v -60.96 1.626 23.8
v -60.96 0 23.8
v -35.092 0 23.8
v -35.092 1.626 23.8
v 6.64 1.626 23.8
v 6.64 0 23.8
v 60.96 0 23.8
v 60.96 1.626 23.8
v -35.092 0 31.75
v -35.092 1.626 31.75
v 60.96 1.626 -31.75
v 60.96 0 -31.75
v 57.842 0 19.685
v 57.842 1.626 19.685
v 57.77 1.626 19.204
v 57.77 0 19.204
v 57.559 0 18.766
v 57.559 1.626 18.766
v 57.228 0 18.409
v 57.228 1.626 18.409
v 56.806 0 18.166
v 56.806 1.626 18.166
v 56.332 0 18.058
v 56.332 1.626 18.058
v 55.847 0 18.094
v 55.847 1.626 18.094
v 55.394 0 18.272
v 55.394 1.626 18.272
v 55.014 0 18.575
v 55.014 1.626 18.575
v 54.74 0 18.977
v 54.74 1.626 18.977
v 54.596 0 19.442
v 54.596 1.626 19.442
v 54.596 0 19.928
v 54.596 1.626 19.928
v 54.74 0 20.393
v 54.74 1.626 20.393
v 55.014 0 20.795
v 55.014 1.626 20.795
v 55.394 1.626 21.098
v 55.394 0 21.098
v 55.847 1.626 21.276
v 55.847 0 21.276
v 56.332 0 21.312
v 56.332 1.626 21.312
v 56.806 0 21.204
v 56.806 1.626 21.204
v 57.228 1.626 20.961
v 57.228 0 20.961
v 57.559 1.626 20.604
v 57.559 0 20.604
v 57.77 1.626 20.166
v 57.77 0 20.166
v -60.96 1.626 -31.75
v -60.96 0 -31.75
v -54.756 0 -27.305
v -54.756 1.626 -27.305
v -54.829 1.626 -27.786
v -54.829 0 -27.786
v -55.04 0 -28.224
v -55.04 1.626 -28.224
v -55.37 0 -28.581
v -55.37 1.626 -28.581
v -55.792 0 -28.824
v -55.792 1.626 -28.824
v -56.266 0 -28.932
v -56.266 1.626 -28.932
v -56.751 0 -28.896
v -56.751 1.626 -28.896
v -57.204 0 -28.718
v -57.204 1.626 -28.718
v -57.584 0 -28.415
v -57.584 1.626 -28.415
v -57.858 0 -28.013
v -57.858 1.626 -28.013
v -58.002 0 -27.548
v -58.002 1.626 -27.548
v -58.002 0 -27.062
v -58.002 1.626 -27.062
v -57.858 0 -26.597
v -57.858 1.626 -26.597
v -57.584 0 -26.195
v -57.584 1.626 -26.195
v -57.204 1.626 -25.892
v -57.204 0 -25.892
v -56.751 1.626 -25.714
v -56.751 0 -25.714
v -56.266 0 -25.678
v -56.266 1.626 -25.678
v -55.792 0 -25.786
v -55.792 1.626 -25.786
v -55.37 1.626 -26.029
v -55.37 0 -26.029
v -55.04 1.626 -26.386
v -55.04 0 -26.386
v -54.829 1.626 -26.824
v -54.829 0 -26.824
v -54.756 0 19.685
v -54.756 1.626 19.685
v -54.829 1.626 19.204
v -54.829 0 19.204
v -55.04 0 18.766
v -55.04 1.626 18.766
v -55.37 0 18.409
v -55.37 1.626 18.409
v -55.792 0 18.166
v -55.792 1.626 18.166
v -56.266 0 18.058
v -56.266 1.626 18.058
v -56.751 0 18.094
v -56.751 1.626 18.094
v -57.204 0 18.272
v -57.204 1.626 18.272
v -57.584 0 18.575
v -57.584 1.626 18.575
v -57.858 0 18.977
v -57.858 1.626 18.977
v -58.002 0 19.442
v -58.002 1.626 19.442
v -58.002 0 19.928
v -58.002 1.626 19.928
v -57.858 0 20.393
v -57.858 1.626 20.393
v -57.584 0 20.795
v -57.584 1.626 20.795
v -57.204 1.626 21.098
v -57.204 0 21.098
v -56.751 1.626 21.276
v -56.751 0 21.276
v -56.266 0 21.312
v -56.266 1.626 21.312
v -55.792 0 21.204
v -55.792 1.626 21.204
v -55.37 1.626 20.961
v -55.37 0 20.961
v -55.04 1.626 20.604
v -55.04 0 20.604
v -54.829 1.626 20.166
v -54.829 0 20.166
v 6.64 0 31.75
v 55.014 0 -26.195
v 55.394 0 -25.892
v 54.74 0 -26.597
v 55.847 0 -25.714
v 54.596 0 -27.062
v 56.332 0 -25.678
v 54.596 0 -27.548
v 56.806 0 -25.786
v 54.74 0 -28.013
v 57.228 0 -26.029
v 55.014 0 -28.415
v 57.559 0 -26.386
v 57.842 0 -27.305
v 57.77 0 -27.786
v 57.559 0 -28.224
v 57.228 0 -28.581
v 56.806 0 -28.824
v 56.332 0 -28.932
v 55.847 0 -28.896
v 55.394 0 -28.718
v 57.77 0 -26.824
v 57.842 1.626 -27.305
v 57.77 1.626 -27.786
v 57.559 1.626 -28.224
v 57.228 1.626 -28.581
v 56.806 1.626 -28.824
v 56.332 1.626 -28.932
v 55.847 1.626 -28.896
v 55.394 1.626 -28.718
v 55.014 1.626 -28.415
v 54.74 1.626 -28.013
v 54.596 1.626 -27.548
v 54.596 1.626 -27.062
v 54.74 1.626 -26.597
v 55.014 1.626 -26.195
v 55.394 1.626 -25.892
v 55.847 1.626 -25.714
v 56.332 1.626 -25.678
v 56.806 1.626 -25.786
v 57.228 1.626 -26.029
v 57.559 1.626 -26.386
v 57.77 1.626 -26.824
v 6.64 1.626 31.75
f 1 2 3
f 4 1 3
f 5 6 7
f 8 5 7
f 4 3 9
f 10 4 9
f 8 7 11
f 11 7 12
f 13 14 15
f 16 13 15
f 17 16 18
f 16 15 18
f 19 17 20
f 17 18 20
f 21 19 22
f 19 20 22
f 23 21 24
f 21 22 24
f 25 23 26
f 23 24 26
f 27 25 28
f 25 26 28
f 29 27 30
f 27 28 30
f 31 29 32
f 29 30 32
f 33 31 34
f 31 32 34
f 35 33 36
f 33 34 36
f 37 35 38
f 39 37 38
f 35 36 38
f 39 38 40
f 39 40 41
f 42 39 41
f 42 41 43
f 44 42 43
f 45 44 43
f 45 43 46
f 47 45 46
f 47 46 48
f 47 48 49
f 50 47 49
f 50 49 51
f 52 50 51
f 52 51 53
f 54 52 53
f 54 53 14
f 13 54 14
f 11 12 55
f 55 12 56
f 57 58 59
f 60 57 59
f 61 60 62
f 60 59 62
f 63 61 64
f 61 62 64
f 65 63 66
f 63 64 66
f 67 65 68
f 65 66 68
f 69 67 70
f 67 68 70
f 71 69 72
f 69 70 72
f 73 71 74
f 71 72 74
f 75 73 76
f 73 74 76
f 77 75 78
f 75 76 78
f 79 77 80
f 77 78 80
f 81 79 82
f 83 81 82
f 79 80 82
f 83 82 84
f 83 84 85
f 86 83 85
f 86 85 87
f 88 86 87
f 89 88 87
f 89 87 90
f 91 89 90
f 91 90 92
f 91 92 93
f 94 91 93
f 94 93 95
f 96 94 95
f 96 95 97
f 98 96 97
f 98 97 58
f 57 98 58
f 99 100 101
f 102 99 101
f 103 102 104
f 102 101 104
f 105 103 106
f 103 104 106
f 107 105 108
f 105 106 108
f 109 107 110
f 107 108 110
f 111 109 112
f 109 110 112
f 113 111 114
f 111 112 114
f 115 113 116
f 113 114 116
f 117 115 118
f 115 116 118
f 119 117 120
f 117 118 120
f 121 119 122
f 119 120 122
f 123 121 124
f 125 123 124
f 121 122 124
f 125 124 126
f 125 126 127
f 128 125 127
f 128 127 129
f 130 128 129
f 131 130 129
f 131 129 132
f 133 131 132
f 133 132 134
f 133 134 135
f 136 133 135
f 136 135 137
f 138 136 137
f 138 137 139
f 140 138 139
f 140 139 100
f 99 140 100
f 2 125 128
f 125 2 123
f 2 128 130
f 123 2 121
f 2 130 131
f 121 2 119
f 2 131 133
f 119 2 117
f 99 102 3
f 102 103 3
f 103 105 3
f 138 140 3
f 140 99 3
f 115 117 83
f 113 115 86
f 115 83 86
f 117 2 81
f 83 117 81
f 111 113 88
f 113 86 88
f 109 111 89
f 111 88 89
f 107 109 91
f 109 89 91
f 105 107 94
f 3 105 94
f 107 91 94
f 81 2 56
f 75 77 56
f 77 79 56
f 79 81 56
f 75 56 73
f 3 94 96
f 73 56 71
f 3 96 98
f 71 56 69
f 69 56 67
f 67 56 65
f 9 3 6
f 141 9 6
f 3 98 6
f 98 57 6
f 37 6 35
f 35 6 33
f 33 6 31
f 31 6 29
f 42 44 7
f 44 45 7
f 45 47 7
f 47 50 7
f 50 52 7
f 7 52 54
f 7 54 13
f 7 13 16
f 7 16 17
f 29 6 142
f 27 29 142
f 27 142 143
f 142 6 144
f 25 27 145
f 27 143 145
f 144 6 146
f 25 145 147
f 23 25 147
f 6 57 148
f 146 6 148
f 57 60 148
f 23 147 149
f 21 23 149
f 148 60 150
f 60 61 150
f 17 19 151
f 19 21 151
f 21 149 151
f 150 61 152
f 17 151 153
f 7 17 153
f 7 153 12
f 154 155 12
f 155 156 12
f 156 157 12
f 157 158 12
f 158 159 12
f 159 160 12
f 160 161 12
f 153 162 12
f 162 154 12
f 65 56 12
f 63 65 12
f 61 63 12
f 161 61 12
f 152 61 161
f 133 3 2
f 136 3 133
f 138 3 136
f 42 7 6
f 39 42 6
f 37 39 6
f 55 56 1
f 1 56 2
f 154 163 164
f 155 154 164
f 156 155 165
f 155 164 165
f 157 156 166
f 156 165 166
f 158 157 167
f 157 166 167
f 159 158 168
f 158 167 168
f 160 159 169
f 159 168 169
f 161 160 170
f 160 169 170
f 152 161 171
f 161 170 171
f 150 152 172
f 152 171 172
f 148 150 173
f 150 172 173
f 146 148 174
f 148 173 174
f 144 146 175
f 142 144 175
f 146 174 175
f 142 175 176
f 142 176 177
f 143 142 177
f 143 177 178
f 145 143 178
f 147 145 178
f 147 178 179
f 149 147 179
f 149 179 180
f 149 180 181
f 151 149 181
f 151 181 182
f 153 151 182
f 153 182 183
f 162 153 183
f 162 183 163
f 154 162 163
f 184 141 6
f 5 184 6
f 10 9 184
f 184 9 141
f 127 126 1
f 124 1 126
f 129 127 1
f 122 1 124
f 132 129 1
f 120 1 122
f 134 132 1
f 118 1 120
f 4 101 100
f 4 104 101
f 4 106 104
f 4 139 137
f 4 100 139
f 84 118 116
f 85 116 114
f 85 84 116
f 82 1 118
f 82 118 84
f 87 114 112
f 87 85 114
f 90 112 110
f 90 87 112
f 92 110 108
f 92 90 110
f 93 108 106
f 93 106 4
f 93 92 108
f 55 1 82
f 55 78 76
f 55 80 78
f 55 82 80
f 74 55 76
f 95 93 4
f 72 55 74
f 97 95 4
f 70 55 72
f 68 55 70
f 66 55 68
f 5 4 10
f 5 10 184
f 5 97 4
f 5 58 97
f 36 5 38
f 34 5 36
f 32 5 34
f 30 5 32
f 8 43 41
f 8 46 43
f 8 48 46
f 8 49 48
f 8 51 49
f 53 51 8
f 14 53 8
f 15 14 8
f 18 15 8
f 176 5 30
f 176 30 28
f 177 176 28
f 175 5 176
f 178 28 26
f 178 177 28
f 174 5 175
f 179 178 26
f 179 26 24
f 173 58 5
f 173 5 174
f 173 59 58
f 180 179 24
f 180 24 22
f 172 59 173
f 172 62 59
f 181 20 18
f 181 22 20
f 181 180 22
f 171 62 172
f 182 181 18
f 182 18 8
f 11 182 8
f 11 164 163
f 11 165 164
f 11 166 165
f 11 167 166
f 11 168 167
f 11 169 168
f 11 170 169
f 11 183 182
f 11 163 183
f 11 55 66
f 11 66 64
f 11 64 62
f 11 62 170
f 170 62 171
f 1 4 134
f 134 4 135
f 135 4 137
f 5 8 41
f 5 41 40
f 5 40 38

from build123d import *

# Parameters (mm, degrees)
BOSS_EXTRUDE1_DEPTH       = 1.6256
F_4_CLEARANCE_HOLE1_D     = 3.2639
F_4_CLEARANCE_HOLE1_DEPTH = 56.388
F_4_CLEARANCE_HOLE1_TIP   = 0.980574487


with BuildPart() as part:
    # Sketch1 → Boss-Extrude1 (new body)
    with BuildSketch(Plane(origin=(0, 0, 0), x_dir=(1, 0, 0), z_dir=(0, 1, 0))):
        Polygon((60.96, 31.75), (19.558, 31.75), (-17.272, 31.75), (-60.96, 31.75), (-60.96, -23.7998), (-35.09199383, -23.7998), (-35.09199383, -31.75), (6.64020617, -31.75), (6.64020617, -23.7998), (60.96, -23.7998), align=None)
    extrude(amount=BOSS_EXTRUDE1_DEPTH)

    # #4 Clearance Hole1
    with Locations(Plane(origin=(-46.701329526, 0, 29.554902493), x_dir=(-1, 0, 0), z_dir=(0, -1, 0))):
        with Locations((-102.911529526, 9.869902493), (-102.911529526, 56.859902493), (9.686670474, 56.859902493), (9.686670474, 9.869902493)):
            Hole(F_4_CLEARANCE_HOLE1_D / 2, depth=F_4_CLEARANCE_HOLE1_DEPTH)
            with Locations((0, 0, -(F_4_CLEARANCE_HOLE1_DEPTH + F_4_CLEARANCE_HOLE1_TIP / 2))):  # 118° drill point
                Cone(0, F_4_CLEARANCE_HOLE1_D / 2, F_4_CLEARANCE_HOLE1_TIP, mode=Mode.SUBTRACT)


solid = part.part
